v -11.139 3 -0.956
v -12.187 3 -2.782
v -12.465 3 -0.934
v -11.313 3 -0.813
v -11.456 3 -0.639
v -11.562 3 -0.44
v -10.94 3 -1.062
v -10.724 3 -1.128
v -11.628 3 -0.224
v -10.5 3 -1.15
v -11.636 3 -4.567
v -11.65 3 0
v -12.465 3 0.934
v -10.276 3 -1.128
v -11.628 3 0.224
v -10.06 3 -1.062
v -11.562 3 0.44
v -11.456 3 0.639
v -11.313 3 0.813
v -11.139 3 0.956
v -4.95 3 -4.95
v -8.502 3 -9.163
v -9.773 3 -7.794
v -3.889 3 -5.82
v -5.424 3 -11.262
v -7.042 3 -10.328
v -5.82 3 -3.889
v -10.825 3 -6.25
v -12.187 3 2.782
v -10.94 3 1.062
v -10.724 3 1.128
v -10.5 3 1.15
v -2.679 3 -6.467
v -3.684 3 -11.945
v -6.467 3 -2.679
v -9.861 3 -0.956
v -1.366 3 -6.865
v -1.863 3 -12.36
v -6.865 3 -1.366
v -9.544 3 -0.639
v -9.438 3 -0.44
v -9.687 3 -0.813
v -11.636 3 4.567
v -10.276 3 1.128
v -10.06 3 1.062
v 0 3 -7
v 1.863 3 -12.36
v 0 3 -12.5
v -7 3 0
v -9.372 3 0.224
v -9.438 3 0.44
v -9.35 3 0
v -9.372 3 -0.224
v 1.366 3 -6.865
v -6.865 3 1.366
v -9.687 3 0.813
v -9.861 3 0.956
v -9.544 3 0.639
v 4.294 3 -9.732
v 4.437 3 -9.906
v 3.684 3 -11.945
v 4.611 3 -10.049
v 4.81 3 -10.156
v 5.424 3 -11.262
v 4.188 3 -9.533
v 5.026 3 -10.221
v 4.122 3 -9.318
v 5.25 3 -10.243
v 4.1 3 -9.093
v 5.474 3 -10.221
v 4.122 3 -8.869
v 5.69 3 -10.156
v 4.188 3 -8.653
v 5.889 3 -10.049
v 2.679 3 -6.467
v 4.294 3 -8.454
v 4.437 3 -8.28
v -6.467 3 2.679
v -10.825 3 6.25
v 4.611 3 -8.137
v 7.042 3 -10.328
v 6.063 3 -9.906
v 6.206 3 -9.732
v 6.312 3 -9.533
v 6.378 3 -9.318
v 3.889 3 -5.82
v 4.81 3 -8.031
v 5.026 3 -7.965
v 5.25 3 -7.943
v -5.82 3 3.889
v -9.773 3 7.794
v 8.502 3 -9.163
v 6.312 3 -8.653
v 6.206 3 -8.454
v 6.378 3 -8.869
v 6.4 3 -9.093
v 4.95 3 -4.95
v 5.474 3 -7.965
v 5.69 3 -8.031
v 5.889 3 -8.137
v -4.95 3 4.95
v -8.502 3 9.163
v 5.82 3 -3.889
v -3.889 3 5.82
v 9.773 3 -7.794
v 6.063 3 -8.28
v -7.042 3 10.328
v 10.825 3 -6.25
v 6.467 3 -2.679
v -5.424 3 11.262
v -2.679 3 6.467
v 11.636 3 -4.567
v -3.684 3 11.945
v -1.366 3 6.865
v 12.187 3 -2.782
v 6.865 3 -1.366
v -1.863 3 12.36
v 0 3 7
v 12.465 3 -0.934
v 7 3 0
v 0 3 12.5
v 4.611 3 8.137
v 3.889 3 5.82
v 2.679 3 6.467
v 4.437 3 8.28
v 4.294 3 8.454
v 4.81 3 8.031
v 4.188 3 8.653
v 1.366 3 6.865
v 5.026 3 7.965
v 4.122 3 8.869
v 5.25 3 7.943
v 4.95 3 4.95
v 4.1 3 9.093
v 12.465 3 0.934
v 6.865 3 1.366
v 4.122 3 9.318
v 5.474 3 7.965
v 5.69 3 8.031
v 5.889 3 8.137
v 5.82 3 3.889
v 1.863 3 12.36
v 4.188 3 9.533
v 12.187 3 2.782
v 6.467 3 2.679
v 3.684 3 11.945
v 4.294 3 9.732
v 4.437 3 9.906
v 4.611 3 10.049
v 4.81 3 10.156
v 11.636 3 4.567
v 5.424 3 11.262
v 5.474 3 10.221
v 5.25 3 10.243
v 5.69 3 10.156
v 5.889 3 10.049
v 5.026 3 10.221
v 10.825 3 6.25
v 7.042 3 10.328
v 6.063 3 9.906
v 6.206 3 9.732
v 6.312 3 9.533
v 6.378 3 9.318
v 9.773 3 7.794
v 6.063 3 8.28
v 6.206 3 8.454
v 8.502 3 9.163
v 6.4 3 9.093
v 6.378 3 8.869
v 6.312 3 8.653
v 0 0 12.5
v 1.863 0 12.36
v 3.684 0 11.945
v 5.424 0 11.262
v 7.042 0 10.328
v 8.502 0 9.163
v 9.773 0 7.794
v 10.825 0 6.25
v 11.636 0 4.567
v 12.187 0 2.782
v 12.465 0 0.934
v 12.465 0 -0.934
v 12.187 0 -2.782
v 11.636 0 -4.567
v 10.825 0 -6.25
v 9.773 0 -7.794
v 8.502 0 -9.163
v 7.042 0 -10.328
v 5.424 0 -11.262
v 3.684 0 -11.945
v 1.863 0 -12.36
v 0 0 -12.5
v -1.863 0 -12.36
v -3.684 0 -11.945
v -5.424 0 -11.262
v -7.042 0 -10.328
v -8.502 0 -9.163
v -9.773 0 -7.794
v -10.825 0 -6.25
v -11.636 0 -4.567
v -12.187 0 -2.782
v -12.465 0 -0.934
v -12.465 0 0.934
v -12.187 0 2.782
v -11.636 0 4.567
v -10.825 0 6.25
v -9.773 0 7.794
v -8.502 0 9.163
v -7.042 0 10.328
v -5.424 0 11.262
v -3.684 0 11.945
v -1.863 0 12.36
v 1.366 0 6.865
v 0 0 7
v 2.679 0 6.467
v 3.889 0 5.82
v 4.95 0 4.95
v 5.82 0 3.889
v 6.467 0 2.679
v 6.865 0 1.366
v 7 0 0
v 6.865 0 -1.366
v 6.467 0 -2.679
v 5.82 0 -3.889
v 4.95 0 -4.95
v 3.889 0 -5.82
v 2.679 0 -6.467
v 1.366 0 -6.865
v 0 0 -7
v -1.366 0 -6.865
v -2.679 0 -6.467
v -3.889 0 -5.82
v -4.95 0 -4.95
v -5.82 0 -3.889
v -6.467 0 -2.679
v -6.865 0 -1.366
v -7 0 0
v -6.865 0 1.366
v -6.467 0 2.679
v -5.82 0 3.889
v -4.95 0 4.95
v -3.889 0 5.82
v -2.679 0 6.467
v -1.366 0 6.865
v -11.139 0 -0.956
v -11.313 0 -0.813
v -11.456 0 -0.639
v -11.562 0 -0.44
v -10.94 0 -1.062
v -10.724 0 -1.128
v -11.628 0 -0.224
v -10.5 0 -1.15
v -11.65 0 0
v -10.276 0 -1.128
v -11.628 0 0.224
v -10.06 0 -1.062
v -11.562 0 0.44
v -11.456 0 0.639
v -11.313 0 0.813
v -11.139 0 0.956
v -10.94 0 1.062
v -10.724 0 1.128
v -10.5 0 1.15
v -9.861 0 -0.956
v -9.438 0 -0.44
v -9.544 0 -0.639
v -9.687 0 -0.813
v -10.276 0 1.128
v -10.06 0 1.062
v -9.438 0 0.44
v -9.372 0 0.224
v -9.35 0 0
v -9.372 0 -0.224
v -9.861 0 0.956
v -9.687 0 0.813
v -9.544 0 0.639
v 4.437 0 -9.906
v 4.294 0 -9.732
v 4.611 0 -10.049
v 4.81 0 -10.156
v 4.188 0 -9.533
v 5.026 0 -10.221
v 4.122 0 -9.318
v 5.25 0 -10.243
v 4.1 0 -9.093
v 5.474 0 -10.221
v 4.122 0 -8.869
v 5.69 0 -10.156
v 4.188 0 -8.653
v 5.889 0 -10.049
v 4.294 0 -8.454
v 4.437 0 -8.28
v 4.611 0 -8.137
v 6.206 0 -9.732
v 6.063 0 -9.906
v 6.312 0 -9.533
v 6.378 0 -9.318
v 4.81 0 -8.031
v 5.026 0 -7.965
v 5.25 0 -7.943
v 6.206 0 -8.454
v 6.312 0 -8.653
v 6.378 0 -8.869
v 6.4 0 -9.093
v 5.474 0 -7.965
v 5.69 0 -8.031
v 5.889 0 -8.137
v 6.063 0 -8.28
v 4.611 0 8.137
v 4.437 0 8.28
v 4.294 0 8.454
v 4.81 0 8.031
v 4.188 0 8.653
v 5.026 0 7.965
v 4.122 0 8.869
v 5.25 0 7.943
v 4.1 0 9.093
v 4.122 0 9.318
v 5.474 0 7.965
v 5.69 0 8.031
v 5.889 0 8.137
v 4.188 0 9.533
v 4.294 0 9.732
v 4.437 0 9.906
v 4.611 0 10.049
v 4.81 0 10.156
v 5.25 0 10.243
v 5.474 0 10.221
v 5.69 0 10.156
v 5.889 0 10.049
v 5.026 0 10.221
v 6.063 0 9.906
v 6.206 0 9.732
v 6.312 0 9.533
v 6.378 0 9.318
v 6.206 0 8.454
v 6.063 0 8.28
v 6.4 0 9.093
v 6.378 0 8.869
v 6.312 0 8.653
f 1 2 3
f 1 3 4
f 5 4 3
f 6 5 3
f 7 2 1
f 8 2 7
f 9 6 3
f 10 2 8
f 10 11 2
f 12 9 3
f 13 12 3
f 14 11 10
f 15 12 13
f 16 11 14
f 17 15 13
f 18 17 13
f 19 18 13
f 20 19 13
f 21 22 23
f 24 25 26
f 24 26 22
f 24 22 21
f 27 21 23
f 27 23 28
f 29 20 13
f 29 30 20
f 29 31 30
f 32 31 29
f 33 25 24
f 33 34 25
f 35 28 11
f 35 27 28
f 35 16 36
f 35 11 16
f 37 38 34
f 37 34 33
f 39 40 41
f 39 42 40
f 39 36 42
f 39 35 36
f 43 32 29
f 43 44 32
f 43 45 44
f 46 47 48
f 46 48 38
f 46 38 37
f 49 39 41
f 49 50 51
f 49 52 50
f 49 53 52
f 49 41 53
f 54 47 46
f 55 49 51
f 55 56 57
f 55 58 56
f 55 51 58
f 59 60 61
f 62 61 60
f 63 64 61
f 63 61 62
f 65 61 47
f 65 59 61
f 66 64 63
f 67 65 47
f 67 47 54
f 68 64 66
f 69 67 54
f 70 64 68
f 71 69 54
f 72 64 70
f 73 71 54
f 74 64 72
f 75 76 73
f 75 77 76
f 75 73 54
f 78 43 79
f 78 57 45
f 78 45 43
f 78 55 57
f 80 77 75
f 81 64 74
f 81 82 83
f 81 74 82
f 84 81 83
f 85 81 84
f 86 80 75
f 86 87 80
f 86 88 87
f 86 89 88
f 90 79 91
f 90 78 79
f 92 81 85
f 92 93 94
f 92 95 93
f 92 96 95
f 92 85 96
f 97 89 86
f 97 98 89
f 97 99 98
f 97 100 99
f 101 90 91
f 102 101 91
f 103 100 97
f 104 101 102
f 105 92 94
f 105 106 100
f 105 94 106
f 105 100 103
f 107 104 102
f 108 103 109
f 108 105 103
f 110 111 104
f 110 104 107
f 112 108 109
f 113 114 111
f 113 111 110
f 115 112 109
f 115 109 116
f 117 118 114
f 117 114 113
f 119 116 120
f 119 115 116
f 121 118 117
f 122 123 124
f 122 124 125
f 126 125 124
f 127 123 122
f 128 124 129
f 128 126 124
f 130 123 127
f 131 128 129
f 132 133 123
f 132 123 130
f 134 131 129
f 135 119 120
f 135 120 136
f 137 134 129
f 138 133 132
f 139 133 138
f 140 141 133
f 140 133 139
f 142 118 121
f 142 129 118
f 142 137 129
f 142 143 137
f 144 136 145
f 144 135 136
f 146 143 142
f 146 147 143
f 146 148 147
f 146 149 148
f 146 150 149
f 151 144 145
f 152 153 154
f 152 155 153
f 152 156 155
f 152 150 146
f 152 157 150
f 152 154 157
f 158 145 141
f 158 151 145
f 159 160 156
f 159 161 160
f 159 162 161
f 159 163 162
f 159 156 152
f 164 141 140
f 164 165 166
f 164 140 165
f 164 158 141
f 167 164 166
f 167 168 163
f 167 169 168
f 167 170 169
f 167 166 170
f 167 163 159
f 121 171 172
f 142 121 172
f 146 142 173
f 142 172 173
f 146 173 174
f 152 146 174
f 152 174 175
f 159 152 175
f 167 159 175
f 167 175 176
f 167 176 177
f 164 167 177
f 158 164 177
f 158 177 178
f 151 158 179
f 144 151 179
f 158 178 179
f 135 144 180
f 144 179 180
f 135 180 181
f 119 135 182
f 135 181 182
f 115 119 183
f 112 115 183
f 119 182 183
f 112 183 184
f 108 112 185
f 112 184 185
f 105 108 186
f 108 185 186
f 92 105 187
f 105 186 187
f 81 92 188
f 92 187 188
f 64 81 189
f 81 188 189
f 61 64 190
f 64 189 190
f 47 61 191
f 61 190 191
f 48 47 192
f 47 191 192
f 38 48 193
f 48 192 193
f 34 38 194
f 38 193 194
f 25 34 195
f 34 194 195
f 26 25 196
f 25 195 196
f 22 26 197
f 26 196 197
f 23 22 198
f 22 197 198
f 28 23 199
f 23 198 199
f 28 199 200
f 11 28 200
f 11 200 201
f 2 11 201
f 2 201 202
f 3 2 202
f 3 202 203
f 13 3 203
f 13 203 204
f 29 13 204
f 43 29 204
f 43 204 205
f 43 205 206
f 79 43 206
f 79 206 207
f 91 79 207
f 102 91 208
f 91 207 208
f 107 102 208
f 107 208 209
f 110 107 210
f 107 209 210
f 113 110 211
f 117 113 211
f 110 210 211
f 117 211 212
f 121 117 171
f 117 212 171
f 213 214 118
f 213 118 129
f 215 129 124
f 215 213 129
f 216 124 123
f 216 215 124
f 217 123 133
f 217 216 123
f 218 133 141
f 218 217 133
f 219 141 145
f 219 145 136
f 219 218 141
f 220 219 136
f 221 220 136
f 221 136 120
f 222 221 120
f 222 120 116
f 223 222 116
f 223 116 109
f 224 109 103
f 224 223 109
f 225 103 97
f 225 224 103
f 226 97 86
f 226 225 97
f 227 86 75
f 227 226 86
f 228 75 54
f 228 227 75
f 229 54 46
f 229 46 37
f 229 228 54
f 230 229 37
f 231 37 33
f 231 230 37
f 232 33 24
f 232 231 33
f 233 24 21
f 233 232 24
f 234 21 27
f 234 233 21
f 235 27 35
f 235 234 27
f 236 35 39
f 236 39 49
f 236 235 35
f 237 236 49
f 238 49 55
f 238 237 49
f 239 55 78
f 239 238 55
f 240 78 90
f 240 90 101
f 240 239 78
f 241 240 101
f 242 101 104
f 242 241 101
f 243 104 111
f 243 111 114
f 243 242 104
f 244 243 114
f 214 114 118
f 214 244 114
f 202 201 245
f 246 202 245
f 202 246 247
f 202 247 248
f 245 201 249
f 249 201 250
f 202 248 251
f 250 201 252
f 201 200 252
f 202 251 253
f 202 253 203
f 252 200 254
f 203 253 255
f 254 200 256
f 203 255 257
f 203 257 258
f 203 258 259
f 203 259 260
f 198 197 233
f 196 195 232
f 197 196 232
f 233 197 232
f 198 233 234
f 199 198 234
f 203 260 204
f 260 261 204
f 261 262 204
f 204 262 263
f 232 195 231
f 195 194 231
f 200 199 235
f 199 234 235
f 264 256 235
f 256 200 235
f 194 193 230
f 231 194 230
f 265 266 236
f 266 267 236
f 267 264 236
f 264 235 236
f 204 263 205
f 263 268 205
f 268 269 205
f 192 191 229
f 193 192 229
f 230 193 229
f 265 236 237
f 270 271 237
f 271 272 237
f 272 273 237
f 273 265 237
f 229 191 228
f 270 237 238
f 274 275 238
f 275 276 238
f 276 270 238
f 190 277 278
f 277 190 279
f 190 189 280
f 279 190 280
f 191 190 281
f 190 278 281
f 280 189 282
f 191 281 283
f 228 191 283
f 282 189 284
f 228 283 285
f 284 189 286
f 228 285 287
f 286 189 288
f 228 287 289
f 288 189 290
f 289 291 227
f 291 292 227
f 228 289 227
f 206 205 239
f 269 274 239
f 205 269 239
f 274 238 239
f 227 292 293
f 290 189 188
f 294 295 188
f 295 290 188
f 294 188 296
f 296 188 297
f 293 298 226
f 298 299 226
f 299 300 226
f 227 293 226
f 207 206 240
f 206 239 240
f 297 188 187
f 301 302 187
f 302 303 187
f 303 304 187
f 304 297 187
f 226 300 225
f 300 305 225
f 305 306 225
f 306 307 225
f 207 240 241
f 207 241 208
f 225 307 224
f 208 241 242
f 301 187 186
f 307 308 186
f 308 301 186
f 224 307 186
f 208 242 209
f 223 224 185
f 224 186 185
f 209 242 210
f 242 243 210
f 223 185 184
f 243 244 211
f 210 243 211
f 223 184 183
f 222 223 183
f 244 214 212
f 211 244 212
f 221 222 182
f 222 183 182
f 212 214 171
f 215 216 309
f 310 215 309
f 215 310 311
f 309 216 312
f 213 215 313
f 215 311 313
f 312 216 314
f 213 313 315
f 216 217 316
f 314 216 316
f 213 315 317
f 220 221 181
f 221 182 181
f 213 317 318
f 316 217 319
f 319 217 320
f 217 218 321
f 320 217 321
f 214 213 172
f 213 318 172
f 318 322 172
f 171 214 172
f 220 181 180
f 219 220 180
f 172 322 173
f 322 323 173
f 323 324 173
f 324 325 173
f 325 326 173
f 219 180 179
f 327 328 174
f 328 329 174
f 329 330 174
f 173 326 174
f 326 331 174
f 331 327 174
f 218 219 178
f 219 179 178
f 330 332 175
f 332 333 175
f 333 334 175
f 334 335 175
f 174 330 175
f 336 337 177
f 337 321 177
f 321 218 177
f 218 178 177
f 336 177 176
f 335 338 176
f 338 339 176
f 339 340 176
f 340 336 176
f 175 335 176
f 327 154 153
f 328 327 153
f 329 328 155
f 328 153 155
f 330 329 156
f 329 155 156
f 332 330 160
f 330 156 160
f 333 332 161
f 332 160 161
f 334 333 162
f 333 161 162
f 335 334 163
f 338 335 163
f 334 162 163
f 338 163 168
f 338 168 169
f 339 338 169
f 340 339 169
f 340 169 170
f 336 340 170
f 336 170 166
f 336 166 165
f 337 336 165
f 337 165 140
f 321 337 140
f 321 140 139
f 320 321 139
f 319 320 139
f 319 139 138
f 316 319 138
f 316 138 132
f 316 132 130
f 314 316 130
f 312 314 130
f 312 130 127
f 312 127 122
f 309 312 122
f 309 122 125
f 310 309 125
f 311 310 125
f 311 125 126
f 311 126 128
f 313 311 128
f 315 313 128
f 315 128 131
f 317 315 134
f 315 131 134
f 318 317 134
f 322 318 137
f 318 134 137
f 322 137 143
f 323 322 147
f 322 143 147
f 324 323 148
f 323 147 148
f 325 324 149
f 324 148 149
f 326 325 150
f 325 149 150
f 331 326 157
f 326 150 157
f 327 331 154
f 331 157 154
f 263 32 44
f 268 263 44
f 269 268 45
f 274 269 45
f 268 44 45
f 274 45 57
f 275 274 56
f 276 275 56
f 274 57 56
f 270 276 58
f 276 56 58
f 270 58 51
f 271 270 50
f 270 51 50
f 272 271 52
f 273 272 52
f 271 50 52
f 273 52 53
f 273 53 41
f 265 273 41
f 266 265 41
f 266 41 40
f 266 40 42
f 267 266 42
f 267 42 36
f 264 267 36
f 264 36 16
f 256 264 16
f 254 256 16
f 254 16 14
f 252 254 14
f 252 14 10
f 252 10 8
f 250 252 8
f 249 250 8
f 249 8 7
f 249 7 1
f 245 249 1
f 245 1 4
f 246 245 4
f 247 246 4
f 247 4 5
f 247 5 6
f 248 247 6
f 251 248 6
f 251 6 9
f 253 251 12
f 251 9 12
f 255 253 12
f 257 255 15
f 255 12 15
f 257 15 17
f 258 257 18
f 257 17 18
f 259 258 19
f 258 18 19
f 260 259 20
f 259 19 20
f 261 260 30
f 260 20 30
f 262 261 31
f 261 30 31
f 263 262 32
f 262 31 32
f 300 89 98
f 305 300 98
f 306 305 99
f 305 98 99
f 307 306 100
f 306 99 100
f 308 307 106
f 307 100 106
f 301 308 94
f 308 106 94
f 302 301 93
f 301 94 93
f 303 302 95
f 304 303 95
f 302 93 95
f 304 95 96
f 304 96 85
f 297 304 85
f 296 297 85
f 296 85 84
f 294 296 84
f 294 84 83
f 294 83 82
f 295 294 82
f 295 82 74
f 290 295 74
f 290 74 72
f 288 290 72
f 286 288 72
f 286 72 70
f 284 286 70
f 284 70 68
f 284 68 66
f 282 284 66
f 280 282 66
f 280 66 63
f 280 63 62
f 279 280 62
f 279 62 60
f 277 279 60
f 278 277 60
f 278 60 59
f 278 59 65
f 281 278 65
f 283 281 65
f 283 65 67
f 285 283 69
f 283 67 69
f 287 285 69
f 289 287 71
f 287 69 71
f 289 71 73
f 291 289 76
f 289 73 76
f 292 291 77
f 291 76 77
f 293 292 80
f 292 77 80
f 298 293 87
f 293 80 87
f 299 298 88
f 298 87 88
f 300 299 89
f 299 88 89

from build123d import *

# Parameters (mm, degrees)
SKETCH1_R           = 12.5
SKETCH1_R_2         = 7
BOSS_EXTRUDE1_DEPTH = 3
CUT_EXTRUDE1_REACH  = 19.93
SKETCH3_R           = 1.15


with BuildPart() as part:
    # Sketch1 → Boss-Extrude1 (new body)
    with BuildSketch(Plane(origin=(0, 0, 0), x_dir=(1, 0, 0), z_dir=(0, 1, 0))):
        with Locations(Location((0, 0, 0), (0, 0, 270))):
            Circle(SKETCH1_R)
        with Locations(Location((0, 0, 0), (0, 0, 270))):
            Circle(SKETCH1_R_2, mode=Mode.SUBTRACT)
    extrude(amount=BOSS_EXTRUDE1_DEPTH)

    # Sketch3 → Cut-Extrude1 (cut, up to next)
    with BuildSketch(Plane(origin=(0, 3, 0), x_dir=(1, 0, 0), z_dir=(0, 1, 0)), mode=Mode.PRIVATE) as cut_extrude1_sk1:
        with Locations(Location((-10.5, 0, 0), (0, 0, 270))):
            Circle(SKETCH3_R)
    cut_extrude1_tool1 = extrude(cut_extrude1_sk1.sketch, amount=-CUT_EXTRUDE1_REACH, mode=Mode.PRIVATE) & part.part
    # Sketch3 → Cut-Extrude1 (cut, up to next)
    with BuildSketch(Plane(origin=(0, 3, 0), x_dir=(1, 0, 0), z_dir=(0, 1, 0)), mode=Mode.PRIVATE) as cut_extrude1_sk2:
        with Locations(Location((5.25, 9.09326674, 0), (0, 0, 270))):
            Circle(SKETCH3_R)
    cut_extrude1_tool2 = extrude(cut_extrude1_sk2.sketch, amount=-CUT_EXTRUDE1_REACH, mode=Mode.PRIVATE) & part.part
    # Sketch3 → Cut-Extrude1 (cut, up to next)
    with BuildSketch(Plane(origin=(0, 3, 0), x_dir=(1, 0, 0), z_dir=(0, 1, 0)), mode=Mode.PRIVATE) as cut_extrude1_sk3:
        with Locations(Location((5.25, -9.09326674, 0), (0, 0, 270))):
            Circle(SKETCH3_R)
    cut_extrude1_tool3 = extrude(cut_extrude1_sk3.sketch, amount=-CUT_EXTRUDE1_REACH, mode=Mode.PRIVATE) & part.part
    add(cut_extrude1_tool1.solids().sort_by_distance((-10.5, 3, 0))[0], mode=Mode.SUBTRACT)
    add(cut_extrude1_tool2.solids().sort_by_distance((5.25, 3, -9.093267))[0], mode=Mode.SUBTRACT)
    add(cut_extrude1_tool3.solids().sort_by_distance((5.25, 3, 9.093267))[0], mode=Mode.SUBTRACT)


solid = part.part
